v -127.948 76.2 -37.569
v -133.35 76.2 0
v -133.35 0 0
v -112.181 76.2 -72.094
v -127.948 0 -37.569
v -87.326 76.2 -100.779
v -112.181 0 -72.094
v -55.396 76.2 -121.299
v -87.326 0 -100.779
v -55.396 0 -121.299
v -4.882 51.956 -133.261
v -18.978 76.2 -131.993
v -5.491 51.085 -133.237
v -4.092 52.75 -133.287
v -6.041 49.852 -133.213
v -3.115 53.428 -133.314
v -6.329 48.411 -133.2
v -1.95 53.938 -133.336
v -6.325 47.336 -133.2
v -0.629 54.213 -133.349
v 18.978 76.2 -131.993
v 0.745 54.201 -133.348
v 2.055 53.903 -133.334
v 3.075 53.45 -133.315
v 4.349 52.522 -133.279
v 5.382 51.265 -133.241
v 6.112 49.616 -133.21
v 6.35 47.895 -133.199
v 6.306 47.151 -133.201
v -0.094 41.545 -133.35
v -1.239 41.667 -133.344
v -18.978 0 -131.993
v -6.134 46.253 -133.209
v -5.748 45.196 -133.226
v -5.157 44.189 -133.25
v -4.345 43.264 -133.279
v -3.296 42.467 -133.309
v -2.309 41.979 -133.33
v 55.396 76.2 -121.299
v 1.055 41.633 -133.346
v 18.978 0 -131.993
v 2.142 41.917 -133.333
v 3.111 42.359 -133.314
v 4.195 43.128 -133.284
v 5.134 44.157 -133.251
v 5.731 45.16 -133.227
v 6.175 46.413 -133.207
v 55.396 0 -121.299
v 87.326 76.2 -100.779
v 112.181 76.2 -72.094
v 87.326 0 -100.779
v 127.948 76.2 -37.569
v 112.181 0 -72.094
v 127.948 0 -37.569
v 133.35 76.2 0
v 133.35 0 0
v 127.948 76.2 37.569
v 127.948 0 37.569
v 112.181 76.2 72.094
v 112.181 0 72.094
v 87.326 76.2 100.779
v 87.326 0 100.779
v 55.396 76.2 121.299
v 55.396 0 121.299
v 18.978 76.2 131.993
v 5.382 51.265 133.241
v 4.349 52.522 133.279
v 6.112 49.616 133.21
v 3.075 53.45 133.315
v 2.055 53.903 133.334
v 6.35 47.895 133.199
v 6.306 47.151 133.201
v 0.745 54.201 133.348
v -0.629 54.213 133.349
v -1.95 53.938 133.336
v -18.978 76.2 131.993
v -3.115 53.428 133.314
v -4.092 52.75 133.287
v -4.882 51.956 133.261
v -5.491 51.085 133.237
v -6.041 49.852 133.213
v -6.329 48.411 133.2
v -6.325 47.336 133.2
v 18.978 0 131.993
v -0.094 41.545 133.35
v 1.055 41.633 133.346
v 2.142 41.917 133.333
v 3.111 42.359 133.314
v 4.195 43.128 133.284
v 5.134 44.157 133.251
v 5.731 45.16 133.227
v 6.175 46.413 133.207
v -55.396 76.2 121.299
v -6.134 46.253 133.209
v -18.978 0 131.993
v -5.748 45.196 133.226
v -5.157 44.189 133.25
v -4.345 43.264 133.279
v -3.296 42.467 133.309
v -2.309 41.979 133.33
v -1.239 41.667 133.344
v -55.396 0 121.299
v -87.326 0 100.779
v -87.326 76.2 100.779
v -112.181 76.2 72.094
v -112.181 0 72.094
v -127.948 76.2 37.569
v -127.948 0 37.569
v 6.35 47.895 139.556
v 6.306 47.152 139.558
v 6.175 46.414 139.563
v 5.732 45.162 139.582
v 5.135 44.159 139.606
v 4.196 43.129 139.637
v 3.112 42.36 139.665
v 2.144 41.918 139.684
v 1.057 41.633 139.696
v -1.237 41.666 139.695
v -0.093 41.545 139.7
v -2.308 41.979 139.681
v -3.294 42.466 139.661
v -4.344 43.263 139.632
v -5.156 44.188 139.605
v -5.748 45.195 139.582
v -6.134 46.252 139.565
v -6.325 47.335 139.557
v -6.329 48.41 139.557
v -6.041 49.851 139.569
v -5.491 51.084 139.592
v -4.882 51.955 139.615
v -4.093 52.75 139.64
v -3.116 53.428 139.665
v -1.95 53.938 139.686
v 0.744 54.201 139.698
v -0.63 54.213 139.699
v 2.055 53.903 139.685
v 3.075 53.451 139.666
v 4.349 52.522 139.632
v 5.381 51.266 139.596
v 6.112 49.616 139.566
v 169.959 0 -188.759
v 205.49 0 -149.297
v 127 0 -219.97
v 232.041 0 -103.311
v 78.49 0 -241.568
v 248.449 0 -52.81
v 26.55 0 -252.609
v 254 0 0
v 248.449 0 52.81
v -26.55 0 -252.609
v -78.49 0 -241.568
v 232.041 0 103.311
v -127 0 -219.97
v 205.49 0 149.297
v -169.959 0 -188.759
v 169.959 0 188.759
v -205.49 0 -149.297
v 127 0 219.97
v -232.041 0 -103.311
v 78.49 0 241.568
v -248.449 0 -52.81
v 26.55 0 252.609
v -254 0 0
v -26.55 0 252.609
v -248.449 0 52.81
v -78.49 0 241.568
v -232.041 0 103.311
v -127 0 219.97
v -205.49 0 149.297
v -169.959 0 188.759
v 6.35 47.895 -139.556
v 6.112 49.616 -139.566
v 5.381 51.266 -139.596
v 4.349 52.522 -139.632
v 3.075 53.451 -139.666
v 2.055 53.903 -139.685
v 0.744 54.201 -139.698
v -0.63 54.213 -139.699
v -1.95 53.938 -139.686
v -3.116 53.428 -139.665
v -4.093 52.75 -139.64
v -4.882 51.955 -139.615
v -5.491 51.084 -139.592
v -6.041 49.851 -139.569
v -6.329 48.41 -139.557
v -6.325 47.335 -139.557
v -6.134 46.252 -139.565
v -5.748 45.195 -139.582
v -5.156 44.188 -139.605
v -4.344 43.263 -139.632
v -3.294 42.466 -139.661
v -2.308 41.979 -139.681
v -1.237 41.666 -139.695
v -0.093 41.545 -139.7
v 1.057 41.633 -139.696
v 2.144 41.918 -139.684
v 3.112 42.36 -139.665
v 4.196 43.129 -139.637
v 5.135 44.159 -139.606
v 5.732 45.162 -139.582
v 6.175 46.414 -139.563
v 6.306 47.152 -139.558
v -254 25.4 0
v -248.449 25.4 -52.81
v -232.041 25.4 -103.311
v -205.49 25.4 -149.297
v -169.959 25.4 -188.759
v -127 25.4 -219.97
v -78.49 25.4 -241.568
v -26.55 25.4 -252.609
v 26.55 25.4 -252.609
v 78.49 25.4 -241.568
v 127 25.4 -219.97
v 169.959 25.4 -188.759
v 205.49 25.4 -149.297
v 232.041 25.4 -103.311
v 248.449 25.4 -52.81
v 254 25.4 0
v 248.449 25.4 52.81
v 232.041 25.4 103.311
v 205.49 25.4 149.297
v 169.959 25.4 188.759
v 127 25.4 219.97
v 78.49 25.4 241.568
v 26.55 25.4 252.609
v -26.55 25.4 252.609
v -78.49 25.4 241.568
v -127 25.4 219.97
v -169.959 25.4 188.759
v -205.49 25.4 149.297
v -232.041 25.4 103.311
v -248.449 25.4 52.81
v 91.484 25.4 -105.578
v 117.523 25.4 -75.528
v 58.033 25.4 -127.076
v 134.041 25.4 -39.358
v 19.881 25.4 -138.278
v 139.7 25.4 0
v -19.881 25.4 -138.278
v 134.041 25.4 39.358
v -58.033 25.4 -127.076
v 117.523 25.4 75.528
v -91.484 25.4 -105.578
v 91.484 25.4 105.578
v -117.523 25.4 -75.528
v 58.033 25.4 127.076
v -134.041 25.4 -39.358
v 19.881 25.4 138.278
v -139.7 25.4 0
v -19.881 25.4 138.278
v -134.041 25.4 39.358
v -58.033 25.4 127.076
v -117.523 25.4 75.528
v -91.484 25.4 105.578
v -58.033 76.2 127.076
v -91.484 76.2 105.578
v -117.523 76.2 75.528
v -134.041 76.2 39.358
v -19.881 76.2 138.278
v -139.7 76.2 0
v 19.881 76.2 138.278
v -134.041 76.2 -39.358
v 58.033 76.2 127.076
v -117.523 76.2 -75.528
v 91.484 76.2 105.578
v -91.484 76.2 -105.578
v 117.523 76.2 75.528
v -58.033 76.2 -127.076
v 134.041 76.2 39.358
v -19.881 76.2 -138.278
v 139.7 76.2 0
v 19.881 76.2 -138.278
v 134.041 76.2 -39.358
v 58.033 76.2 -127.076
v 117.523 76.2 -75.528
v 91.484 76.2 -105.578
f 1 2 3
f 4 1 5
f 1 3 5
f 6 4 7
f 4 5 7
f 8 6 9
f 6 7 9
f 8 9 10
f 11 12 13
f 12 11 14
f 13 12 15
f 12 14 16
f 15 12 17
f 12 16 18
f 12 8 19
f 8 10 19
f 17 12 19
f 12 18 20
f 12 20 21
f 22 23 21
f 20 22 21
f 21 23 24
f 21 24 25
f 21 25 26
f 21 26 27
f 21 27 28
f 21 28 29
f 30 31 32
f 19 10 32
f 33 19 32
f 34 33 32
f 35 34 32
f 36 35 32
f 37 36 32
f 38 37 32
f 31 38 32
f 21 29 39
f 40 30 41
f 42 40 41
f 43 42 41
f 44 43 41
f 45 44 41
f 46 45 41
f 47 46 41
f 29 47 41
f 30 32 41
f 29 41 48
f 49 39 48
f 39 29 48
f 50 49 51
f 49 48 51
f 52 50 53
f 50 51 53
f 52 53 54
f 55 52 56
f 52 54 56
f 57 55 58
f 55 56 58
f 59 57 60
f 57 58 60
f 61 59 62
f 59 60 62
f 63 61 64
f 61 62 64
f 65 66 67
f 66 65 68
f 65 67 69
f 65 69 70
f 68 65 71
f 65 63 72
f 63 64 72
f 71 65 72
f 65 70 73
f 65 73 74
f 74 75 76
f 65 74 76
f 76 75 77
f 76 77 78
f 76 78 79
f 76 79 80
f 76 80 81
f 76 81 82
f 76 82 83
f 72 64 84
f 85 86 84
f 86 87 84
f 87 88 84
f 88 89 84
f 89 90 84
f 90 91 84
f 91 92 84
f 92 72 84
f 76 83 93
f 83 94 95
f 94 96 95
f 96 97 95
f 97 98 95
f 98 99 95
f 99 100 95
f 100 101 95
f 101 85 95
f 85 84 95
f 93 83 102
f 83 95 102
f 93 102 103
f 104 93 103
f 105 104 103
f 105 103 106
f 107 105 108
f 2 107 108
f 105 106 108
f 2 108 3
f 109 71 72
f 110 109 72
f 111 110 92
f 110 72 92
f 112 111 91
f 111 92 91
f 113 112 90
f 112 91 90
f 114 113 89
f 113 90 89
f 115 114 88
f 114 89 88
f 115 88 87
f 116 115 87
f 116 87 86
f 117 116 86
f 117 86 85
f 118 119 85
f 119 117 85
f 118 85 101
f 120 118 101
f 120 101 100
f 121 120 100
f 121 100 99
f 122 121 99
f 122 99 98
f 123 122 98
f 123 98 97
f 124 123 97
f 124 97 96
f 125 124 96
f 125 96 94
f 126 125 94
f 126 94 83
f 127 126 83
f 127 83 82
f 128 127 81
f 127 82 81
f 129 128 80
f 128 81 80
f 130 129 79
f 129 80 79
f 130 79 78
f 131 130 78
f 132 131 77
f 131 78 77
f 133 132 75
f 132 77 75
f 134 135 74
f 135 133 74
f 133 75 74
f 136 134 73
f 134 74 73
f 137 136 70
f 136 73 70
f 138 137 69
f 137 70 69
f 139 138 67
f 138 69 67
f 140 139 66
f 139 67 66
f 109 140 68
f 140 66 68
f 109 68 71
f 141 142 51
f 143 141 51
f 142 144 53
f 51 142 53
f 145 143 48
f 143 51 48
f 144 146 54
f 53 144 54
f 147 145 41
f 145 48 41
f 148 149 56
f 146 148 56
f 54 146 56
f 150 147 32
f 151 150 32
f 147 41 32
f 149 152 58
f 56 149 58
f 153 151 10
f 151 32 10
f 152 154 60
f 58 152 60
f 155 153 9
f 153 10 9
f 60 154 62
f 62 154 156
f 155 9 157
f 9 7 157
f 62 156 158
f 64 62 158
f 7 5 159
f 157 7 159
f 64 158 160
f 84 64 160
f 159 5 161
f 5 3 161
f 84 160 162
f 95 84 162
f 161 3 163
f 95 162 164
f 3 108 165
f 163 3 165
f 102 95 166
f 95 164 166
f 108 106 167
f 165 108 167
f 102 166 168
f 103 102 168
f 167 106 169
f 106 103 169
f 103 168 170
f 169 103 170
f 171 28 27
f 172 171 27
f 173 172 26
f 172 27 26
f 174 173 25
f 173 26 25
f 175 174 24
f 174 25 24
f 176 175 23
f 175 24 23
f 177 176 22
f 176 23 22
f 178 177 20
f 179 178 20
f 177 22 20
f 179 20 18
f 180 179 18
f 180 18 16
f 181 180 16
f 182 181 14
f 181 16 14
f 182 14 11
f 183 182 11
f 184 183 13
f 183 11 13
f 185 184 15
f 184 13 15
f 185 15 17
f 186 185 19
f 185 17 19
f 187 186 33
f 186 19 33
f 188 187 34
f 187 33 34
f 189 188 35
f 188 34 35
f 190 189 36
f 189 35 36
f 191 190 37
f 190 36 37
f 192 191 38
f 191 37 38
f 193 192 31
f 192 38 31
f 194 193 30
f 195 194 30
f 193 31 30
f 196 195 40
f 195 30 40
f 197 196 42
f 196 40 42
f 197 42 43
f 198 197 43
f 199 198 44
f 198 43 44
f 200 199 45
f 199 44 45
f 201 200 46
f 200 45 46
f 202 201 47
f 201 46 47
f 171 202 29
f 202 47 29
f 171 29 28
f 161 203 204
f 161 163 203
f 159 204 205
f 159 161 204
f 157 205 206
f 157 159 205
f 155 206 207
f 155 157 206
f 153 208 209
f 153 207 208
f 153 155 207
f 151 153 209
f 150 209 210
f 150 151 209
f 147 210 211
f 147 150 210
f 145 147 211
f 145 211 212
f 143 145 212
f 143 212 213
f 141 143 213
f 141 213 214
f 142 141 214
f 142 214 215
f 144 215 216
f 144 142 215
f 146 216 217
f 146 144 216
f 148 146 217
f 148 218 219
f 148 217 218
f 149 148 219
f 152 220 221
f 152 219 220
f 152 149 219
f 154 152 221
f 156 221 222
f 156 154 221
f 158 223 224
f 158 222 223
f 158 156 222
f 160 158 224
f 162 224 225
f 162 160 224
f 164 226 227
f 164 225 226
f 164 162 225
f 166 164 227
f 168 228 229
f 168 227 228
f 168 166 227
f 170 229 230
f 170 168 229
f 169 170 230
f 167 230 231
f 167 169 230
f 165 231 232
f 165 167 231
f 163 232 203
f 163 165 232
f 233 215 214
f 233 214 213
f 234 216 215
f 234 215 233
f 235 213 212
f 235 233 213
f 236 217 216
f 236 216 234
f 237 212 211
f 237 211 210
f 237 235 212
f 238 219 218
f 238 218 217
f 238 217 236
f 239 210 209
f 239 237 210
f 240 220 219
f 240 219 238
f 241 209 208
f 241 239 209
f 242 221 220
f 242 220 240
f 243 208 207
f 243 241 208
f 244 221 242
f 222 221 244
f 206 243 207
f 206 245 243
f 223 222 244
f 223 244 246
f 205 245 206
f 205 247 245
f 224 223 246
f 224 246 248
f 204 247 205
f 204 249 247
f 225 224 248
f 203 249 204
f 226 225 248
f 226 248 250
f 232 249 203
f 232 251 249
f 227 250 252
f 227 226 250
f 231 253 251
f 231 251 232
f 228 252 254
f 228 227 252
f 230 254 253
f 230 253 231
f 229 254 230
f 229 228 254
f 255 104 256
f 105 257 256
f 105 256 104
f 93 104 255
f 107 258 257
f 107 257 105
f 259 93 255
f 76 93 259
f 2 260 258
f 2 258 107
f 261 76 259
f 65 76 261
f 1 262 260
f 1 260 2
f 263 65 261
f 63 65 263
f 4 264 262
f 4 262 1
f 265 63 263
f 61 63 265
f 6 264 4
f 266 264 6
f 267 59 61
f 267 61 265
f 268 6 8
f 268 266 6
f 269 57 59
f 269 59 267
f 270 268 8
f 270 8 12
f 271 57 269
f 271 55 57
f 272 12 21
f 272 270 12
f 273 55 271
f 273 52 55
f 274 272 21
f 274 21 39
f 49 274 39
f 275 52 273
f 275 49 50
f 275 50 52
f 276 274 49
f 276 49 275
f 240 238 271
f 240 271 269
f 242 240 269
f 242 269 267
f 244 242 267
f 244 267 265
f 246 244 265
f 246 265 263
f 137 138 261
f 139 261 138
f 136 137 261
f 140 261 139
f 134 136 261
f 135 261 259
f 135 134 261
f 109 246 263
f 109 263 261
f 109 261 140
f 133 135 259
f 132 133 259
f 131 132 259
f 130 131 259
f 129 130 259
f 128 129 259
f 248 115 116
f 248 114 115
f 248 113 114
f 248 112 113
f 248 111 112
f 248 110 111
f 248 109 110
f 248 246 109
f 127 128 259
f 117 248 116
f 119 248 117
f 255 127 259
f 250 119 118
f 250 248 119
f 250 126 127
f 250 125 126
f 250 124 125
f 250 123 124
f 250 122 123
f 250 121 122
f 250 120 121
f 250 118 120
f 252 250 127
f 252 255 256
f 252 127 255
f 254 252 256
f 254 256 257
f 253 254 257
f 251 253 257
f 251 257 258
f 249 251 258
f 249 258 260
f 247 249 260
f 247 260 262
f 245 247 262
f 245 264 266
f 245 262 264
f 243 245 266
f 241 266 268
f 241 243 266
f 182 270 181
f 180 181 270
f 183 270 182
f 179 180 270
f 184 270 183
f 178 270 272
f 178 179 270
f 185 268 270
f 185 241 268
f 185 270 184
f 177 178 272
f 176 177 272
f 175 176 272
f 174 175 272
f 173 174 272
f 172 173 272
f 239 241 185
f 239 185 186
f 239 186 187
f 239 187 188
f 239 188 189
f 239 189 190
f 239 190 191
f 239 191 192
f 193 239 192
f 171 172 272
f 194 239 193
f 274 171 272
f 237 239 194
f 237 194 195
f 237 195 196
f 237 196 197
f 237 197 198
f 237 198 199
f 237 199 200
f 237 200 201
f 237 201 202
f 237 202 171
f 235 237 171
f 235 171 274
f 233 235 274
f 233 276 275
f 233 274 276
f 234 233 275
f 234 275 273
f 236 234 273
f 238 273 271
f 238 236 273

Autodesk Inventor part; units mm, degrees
ref_plane "YZ Plane" through (0, 0, 0) normal (1, 0, 0) x (0, 1, 0)
ref_plane "XZ Plane" through (0, 0, 0) normal (0, 1, 0) x (-1, 0, 0)
ref_plane "XY Plane" through (0, 0, 0) normal (0, 0, 1) x (1, 0, 0)
sketch "Sketch1" plane through (0, 0, 0) normal (0, 1, 0) x (-1, 0, 0)
  circle A0 centre (0, 0) radius 254
  dimension "d0" = 508
extrude "Extrusion1" add sketch "Sketch1" along normal blind 25.4
sketch "Sketch2" plane through (0, 25.4, 0) normal (0, 1, 0) x (1, 0, 0)
  circle A0 centre (0, 0) radius 139.7
  dimension "d3" = 279.4
extrude "Extrusion2" add sketch "Sketch2" along normal blind 50.8
sketch "Sketch3" plane through (0, 0, 0) normal (0, 1, 0) x (-1, 0, 0)
  circle A0 centre (0, 0) radius 133.35
  dimension "d6" = 266.7
extrude "Extrusion3" cut sketch "Sketch3" along normal up to next
sketch "Sketch4" plane through (0, 0, 0) normal (0, 0, 1) x (1, 0, 0)
  circle A0 centre (0, 50.8) radius 6.35
  line L0 (254, 25.4) -> (-254, 25.4) projected
  point P0 (0, 0)
  dimension "d9" = 12.7
  dimension "d10" = 25.4
extrude "Extrusion4" cut sketch "Sketch4" along normal mid plane 228.6
sketch "Sketch5" plane through (0, 0, 0) normal (0, 0, 1) x (1, 0, 0)
  circle A0 centre (0, 47.8947) radius 6.35
  point P0 (0, 0)
  dimension "d13" = 12.7
extrude "Extrusion5" cut sketch "Sketch5" along normal mid plane 381
properties part number "Top2"
